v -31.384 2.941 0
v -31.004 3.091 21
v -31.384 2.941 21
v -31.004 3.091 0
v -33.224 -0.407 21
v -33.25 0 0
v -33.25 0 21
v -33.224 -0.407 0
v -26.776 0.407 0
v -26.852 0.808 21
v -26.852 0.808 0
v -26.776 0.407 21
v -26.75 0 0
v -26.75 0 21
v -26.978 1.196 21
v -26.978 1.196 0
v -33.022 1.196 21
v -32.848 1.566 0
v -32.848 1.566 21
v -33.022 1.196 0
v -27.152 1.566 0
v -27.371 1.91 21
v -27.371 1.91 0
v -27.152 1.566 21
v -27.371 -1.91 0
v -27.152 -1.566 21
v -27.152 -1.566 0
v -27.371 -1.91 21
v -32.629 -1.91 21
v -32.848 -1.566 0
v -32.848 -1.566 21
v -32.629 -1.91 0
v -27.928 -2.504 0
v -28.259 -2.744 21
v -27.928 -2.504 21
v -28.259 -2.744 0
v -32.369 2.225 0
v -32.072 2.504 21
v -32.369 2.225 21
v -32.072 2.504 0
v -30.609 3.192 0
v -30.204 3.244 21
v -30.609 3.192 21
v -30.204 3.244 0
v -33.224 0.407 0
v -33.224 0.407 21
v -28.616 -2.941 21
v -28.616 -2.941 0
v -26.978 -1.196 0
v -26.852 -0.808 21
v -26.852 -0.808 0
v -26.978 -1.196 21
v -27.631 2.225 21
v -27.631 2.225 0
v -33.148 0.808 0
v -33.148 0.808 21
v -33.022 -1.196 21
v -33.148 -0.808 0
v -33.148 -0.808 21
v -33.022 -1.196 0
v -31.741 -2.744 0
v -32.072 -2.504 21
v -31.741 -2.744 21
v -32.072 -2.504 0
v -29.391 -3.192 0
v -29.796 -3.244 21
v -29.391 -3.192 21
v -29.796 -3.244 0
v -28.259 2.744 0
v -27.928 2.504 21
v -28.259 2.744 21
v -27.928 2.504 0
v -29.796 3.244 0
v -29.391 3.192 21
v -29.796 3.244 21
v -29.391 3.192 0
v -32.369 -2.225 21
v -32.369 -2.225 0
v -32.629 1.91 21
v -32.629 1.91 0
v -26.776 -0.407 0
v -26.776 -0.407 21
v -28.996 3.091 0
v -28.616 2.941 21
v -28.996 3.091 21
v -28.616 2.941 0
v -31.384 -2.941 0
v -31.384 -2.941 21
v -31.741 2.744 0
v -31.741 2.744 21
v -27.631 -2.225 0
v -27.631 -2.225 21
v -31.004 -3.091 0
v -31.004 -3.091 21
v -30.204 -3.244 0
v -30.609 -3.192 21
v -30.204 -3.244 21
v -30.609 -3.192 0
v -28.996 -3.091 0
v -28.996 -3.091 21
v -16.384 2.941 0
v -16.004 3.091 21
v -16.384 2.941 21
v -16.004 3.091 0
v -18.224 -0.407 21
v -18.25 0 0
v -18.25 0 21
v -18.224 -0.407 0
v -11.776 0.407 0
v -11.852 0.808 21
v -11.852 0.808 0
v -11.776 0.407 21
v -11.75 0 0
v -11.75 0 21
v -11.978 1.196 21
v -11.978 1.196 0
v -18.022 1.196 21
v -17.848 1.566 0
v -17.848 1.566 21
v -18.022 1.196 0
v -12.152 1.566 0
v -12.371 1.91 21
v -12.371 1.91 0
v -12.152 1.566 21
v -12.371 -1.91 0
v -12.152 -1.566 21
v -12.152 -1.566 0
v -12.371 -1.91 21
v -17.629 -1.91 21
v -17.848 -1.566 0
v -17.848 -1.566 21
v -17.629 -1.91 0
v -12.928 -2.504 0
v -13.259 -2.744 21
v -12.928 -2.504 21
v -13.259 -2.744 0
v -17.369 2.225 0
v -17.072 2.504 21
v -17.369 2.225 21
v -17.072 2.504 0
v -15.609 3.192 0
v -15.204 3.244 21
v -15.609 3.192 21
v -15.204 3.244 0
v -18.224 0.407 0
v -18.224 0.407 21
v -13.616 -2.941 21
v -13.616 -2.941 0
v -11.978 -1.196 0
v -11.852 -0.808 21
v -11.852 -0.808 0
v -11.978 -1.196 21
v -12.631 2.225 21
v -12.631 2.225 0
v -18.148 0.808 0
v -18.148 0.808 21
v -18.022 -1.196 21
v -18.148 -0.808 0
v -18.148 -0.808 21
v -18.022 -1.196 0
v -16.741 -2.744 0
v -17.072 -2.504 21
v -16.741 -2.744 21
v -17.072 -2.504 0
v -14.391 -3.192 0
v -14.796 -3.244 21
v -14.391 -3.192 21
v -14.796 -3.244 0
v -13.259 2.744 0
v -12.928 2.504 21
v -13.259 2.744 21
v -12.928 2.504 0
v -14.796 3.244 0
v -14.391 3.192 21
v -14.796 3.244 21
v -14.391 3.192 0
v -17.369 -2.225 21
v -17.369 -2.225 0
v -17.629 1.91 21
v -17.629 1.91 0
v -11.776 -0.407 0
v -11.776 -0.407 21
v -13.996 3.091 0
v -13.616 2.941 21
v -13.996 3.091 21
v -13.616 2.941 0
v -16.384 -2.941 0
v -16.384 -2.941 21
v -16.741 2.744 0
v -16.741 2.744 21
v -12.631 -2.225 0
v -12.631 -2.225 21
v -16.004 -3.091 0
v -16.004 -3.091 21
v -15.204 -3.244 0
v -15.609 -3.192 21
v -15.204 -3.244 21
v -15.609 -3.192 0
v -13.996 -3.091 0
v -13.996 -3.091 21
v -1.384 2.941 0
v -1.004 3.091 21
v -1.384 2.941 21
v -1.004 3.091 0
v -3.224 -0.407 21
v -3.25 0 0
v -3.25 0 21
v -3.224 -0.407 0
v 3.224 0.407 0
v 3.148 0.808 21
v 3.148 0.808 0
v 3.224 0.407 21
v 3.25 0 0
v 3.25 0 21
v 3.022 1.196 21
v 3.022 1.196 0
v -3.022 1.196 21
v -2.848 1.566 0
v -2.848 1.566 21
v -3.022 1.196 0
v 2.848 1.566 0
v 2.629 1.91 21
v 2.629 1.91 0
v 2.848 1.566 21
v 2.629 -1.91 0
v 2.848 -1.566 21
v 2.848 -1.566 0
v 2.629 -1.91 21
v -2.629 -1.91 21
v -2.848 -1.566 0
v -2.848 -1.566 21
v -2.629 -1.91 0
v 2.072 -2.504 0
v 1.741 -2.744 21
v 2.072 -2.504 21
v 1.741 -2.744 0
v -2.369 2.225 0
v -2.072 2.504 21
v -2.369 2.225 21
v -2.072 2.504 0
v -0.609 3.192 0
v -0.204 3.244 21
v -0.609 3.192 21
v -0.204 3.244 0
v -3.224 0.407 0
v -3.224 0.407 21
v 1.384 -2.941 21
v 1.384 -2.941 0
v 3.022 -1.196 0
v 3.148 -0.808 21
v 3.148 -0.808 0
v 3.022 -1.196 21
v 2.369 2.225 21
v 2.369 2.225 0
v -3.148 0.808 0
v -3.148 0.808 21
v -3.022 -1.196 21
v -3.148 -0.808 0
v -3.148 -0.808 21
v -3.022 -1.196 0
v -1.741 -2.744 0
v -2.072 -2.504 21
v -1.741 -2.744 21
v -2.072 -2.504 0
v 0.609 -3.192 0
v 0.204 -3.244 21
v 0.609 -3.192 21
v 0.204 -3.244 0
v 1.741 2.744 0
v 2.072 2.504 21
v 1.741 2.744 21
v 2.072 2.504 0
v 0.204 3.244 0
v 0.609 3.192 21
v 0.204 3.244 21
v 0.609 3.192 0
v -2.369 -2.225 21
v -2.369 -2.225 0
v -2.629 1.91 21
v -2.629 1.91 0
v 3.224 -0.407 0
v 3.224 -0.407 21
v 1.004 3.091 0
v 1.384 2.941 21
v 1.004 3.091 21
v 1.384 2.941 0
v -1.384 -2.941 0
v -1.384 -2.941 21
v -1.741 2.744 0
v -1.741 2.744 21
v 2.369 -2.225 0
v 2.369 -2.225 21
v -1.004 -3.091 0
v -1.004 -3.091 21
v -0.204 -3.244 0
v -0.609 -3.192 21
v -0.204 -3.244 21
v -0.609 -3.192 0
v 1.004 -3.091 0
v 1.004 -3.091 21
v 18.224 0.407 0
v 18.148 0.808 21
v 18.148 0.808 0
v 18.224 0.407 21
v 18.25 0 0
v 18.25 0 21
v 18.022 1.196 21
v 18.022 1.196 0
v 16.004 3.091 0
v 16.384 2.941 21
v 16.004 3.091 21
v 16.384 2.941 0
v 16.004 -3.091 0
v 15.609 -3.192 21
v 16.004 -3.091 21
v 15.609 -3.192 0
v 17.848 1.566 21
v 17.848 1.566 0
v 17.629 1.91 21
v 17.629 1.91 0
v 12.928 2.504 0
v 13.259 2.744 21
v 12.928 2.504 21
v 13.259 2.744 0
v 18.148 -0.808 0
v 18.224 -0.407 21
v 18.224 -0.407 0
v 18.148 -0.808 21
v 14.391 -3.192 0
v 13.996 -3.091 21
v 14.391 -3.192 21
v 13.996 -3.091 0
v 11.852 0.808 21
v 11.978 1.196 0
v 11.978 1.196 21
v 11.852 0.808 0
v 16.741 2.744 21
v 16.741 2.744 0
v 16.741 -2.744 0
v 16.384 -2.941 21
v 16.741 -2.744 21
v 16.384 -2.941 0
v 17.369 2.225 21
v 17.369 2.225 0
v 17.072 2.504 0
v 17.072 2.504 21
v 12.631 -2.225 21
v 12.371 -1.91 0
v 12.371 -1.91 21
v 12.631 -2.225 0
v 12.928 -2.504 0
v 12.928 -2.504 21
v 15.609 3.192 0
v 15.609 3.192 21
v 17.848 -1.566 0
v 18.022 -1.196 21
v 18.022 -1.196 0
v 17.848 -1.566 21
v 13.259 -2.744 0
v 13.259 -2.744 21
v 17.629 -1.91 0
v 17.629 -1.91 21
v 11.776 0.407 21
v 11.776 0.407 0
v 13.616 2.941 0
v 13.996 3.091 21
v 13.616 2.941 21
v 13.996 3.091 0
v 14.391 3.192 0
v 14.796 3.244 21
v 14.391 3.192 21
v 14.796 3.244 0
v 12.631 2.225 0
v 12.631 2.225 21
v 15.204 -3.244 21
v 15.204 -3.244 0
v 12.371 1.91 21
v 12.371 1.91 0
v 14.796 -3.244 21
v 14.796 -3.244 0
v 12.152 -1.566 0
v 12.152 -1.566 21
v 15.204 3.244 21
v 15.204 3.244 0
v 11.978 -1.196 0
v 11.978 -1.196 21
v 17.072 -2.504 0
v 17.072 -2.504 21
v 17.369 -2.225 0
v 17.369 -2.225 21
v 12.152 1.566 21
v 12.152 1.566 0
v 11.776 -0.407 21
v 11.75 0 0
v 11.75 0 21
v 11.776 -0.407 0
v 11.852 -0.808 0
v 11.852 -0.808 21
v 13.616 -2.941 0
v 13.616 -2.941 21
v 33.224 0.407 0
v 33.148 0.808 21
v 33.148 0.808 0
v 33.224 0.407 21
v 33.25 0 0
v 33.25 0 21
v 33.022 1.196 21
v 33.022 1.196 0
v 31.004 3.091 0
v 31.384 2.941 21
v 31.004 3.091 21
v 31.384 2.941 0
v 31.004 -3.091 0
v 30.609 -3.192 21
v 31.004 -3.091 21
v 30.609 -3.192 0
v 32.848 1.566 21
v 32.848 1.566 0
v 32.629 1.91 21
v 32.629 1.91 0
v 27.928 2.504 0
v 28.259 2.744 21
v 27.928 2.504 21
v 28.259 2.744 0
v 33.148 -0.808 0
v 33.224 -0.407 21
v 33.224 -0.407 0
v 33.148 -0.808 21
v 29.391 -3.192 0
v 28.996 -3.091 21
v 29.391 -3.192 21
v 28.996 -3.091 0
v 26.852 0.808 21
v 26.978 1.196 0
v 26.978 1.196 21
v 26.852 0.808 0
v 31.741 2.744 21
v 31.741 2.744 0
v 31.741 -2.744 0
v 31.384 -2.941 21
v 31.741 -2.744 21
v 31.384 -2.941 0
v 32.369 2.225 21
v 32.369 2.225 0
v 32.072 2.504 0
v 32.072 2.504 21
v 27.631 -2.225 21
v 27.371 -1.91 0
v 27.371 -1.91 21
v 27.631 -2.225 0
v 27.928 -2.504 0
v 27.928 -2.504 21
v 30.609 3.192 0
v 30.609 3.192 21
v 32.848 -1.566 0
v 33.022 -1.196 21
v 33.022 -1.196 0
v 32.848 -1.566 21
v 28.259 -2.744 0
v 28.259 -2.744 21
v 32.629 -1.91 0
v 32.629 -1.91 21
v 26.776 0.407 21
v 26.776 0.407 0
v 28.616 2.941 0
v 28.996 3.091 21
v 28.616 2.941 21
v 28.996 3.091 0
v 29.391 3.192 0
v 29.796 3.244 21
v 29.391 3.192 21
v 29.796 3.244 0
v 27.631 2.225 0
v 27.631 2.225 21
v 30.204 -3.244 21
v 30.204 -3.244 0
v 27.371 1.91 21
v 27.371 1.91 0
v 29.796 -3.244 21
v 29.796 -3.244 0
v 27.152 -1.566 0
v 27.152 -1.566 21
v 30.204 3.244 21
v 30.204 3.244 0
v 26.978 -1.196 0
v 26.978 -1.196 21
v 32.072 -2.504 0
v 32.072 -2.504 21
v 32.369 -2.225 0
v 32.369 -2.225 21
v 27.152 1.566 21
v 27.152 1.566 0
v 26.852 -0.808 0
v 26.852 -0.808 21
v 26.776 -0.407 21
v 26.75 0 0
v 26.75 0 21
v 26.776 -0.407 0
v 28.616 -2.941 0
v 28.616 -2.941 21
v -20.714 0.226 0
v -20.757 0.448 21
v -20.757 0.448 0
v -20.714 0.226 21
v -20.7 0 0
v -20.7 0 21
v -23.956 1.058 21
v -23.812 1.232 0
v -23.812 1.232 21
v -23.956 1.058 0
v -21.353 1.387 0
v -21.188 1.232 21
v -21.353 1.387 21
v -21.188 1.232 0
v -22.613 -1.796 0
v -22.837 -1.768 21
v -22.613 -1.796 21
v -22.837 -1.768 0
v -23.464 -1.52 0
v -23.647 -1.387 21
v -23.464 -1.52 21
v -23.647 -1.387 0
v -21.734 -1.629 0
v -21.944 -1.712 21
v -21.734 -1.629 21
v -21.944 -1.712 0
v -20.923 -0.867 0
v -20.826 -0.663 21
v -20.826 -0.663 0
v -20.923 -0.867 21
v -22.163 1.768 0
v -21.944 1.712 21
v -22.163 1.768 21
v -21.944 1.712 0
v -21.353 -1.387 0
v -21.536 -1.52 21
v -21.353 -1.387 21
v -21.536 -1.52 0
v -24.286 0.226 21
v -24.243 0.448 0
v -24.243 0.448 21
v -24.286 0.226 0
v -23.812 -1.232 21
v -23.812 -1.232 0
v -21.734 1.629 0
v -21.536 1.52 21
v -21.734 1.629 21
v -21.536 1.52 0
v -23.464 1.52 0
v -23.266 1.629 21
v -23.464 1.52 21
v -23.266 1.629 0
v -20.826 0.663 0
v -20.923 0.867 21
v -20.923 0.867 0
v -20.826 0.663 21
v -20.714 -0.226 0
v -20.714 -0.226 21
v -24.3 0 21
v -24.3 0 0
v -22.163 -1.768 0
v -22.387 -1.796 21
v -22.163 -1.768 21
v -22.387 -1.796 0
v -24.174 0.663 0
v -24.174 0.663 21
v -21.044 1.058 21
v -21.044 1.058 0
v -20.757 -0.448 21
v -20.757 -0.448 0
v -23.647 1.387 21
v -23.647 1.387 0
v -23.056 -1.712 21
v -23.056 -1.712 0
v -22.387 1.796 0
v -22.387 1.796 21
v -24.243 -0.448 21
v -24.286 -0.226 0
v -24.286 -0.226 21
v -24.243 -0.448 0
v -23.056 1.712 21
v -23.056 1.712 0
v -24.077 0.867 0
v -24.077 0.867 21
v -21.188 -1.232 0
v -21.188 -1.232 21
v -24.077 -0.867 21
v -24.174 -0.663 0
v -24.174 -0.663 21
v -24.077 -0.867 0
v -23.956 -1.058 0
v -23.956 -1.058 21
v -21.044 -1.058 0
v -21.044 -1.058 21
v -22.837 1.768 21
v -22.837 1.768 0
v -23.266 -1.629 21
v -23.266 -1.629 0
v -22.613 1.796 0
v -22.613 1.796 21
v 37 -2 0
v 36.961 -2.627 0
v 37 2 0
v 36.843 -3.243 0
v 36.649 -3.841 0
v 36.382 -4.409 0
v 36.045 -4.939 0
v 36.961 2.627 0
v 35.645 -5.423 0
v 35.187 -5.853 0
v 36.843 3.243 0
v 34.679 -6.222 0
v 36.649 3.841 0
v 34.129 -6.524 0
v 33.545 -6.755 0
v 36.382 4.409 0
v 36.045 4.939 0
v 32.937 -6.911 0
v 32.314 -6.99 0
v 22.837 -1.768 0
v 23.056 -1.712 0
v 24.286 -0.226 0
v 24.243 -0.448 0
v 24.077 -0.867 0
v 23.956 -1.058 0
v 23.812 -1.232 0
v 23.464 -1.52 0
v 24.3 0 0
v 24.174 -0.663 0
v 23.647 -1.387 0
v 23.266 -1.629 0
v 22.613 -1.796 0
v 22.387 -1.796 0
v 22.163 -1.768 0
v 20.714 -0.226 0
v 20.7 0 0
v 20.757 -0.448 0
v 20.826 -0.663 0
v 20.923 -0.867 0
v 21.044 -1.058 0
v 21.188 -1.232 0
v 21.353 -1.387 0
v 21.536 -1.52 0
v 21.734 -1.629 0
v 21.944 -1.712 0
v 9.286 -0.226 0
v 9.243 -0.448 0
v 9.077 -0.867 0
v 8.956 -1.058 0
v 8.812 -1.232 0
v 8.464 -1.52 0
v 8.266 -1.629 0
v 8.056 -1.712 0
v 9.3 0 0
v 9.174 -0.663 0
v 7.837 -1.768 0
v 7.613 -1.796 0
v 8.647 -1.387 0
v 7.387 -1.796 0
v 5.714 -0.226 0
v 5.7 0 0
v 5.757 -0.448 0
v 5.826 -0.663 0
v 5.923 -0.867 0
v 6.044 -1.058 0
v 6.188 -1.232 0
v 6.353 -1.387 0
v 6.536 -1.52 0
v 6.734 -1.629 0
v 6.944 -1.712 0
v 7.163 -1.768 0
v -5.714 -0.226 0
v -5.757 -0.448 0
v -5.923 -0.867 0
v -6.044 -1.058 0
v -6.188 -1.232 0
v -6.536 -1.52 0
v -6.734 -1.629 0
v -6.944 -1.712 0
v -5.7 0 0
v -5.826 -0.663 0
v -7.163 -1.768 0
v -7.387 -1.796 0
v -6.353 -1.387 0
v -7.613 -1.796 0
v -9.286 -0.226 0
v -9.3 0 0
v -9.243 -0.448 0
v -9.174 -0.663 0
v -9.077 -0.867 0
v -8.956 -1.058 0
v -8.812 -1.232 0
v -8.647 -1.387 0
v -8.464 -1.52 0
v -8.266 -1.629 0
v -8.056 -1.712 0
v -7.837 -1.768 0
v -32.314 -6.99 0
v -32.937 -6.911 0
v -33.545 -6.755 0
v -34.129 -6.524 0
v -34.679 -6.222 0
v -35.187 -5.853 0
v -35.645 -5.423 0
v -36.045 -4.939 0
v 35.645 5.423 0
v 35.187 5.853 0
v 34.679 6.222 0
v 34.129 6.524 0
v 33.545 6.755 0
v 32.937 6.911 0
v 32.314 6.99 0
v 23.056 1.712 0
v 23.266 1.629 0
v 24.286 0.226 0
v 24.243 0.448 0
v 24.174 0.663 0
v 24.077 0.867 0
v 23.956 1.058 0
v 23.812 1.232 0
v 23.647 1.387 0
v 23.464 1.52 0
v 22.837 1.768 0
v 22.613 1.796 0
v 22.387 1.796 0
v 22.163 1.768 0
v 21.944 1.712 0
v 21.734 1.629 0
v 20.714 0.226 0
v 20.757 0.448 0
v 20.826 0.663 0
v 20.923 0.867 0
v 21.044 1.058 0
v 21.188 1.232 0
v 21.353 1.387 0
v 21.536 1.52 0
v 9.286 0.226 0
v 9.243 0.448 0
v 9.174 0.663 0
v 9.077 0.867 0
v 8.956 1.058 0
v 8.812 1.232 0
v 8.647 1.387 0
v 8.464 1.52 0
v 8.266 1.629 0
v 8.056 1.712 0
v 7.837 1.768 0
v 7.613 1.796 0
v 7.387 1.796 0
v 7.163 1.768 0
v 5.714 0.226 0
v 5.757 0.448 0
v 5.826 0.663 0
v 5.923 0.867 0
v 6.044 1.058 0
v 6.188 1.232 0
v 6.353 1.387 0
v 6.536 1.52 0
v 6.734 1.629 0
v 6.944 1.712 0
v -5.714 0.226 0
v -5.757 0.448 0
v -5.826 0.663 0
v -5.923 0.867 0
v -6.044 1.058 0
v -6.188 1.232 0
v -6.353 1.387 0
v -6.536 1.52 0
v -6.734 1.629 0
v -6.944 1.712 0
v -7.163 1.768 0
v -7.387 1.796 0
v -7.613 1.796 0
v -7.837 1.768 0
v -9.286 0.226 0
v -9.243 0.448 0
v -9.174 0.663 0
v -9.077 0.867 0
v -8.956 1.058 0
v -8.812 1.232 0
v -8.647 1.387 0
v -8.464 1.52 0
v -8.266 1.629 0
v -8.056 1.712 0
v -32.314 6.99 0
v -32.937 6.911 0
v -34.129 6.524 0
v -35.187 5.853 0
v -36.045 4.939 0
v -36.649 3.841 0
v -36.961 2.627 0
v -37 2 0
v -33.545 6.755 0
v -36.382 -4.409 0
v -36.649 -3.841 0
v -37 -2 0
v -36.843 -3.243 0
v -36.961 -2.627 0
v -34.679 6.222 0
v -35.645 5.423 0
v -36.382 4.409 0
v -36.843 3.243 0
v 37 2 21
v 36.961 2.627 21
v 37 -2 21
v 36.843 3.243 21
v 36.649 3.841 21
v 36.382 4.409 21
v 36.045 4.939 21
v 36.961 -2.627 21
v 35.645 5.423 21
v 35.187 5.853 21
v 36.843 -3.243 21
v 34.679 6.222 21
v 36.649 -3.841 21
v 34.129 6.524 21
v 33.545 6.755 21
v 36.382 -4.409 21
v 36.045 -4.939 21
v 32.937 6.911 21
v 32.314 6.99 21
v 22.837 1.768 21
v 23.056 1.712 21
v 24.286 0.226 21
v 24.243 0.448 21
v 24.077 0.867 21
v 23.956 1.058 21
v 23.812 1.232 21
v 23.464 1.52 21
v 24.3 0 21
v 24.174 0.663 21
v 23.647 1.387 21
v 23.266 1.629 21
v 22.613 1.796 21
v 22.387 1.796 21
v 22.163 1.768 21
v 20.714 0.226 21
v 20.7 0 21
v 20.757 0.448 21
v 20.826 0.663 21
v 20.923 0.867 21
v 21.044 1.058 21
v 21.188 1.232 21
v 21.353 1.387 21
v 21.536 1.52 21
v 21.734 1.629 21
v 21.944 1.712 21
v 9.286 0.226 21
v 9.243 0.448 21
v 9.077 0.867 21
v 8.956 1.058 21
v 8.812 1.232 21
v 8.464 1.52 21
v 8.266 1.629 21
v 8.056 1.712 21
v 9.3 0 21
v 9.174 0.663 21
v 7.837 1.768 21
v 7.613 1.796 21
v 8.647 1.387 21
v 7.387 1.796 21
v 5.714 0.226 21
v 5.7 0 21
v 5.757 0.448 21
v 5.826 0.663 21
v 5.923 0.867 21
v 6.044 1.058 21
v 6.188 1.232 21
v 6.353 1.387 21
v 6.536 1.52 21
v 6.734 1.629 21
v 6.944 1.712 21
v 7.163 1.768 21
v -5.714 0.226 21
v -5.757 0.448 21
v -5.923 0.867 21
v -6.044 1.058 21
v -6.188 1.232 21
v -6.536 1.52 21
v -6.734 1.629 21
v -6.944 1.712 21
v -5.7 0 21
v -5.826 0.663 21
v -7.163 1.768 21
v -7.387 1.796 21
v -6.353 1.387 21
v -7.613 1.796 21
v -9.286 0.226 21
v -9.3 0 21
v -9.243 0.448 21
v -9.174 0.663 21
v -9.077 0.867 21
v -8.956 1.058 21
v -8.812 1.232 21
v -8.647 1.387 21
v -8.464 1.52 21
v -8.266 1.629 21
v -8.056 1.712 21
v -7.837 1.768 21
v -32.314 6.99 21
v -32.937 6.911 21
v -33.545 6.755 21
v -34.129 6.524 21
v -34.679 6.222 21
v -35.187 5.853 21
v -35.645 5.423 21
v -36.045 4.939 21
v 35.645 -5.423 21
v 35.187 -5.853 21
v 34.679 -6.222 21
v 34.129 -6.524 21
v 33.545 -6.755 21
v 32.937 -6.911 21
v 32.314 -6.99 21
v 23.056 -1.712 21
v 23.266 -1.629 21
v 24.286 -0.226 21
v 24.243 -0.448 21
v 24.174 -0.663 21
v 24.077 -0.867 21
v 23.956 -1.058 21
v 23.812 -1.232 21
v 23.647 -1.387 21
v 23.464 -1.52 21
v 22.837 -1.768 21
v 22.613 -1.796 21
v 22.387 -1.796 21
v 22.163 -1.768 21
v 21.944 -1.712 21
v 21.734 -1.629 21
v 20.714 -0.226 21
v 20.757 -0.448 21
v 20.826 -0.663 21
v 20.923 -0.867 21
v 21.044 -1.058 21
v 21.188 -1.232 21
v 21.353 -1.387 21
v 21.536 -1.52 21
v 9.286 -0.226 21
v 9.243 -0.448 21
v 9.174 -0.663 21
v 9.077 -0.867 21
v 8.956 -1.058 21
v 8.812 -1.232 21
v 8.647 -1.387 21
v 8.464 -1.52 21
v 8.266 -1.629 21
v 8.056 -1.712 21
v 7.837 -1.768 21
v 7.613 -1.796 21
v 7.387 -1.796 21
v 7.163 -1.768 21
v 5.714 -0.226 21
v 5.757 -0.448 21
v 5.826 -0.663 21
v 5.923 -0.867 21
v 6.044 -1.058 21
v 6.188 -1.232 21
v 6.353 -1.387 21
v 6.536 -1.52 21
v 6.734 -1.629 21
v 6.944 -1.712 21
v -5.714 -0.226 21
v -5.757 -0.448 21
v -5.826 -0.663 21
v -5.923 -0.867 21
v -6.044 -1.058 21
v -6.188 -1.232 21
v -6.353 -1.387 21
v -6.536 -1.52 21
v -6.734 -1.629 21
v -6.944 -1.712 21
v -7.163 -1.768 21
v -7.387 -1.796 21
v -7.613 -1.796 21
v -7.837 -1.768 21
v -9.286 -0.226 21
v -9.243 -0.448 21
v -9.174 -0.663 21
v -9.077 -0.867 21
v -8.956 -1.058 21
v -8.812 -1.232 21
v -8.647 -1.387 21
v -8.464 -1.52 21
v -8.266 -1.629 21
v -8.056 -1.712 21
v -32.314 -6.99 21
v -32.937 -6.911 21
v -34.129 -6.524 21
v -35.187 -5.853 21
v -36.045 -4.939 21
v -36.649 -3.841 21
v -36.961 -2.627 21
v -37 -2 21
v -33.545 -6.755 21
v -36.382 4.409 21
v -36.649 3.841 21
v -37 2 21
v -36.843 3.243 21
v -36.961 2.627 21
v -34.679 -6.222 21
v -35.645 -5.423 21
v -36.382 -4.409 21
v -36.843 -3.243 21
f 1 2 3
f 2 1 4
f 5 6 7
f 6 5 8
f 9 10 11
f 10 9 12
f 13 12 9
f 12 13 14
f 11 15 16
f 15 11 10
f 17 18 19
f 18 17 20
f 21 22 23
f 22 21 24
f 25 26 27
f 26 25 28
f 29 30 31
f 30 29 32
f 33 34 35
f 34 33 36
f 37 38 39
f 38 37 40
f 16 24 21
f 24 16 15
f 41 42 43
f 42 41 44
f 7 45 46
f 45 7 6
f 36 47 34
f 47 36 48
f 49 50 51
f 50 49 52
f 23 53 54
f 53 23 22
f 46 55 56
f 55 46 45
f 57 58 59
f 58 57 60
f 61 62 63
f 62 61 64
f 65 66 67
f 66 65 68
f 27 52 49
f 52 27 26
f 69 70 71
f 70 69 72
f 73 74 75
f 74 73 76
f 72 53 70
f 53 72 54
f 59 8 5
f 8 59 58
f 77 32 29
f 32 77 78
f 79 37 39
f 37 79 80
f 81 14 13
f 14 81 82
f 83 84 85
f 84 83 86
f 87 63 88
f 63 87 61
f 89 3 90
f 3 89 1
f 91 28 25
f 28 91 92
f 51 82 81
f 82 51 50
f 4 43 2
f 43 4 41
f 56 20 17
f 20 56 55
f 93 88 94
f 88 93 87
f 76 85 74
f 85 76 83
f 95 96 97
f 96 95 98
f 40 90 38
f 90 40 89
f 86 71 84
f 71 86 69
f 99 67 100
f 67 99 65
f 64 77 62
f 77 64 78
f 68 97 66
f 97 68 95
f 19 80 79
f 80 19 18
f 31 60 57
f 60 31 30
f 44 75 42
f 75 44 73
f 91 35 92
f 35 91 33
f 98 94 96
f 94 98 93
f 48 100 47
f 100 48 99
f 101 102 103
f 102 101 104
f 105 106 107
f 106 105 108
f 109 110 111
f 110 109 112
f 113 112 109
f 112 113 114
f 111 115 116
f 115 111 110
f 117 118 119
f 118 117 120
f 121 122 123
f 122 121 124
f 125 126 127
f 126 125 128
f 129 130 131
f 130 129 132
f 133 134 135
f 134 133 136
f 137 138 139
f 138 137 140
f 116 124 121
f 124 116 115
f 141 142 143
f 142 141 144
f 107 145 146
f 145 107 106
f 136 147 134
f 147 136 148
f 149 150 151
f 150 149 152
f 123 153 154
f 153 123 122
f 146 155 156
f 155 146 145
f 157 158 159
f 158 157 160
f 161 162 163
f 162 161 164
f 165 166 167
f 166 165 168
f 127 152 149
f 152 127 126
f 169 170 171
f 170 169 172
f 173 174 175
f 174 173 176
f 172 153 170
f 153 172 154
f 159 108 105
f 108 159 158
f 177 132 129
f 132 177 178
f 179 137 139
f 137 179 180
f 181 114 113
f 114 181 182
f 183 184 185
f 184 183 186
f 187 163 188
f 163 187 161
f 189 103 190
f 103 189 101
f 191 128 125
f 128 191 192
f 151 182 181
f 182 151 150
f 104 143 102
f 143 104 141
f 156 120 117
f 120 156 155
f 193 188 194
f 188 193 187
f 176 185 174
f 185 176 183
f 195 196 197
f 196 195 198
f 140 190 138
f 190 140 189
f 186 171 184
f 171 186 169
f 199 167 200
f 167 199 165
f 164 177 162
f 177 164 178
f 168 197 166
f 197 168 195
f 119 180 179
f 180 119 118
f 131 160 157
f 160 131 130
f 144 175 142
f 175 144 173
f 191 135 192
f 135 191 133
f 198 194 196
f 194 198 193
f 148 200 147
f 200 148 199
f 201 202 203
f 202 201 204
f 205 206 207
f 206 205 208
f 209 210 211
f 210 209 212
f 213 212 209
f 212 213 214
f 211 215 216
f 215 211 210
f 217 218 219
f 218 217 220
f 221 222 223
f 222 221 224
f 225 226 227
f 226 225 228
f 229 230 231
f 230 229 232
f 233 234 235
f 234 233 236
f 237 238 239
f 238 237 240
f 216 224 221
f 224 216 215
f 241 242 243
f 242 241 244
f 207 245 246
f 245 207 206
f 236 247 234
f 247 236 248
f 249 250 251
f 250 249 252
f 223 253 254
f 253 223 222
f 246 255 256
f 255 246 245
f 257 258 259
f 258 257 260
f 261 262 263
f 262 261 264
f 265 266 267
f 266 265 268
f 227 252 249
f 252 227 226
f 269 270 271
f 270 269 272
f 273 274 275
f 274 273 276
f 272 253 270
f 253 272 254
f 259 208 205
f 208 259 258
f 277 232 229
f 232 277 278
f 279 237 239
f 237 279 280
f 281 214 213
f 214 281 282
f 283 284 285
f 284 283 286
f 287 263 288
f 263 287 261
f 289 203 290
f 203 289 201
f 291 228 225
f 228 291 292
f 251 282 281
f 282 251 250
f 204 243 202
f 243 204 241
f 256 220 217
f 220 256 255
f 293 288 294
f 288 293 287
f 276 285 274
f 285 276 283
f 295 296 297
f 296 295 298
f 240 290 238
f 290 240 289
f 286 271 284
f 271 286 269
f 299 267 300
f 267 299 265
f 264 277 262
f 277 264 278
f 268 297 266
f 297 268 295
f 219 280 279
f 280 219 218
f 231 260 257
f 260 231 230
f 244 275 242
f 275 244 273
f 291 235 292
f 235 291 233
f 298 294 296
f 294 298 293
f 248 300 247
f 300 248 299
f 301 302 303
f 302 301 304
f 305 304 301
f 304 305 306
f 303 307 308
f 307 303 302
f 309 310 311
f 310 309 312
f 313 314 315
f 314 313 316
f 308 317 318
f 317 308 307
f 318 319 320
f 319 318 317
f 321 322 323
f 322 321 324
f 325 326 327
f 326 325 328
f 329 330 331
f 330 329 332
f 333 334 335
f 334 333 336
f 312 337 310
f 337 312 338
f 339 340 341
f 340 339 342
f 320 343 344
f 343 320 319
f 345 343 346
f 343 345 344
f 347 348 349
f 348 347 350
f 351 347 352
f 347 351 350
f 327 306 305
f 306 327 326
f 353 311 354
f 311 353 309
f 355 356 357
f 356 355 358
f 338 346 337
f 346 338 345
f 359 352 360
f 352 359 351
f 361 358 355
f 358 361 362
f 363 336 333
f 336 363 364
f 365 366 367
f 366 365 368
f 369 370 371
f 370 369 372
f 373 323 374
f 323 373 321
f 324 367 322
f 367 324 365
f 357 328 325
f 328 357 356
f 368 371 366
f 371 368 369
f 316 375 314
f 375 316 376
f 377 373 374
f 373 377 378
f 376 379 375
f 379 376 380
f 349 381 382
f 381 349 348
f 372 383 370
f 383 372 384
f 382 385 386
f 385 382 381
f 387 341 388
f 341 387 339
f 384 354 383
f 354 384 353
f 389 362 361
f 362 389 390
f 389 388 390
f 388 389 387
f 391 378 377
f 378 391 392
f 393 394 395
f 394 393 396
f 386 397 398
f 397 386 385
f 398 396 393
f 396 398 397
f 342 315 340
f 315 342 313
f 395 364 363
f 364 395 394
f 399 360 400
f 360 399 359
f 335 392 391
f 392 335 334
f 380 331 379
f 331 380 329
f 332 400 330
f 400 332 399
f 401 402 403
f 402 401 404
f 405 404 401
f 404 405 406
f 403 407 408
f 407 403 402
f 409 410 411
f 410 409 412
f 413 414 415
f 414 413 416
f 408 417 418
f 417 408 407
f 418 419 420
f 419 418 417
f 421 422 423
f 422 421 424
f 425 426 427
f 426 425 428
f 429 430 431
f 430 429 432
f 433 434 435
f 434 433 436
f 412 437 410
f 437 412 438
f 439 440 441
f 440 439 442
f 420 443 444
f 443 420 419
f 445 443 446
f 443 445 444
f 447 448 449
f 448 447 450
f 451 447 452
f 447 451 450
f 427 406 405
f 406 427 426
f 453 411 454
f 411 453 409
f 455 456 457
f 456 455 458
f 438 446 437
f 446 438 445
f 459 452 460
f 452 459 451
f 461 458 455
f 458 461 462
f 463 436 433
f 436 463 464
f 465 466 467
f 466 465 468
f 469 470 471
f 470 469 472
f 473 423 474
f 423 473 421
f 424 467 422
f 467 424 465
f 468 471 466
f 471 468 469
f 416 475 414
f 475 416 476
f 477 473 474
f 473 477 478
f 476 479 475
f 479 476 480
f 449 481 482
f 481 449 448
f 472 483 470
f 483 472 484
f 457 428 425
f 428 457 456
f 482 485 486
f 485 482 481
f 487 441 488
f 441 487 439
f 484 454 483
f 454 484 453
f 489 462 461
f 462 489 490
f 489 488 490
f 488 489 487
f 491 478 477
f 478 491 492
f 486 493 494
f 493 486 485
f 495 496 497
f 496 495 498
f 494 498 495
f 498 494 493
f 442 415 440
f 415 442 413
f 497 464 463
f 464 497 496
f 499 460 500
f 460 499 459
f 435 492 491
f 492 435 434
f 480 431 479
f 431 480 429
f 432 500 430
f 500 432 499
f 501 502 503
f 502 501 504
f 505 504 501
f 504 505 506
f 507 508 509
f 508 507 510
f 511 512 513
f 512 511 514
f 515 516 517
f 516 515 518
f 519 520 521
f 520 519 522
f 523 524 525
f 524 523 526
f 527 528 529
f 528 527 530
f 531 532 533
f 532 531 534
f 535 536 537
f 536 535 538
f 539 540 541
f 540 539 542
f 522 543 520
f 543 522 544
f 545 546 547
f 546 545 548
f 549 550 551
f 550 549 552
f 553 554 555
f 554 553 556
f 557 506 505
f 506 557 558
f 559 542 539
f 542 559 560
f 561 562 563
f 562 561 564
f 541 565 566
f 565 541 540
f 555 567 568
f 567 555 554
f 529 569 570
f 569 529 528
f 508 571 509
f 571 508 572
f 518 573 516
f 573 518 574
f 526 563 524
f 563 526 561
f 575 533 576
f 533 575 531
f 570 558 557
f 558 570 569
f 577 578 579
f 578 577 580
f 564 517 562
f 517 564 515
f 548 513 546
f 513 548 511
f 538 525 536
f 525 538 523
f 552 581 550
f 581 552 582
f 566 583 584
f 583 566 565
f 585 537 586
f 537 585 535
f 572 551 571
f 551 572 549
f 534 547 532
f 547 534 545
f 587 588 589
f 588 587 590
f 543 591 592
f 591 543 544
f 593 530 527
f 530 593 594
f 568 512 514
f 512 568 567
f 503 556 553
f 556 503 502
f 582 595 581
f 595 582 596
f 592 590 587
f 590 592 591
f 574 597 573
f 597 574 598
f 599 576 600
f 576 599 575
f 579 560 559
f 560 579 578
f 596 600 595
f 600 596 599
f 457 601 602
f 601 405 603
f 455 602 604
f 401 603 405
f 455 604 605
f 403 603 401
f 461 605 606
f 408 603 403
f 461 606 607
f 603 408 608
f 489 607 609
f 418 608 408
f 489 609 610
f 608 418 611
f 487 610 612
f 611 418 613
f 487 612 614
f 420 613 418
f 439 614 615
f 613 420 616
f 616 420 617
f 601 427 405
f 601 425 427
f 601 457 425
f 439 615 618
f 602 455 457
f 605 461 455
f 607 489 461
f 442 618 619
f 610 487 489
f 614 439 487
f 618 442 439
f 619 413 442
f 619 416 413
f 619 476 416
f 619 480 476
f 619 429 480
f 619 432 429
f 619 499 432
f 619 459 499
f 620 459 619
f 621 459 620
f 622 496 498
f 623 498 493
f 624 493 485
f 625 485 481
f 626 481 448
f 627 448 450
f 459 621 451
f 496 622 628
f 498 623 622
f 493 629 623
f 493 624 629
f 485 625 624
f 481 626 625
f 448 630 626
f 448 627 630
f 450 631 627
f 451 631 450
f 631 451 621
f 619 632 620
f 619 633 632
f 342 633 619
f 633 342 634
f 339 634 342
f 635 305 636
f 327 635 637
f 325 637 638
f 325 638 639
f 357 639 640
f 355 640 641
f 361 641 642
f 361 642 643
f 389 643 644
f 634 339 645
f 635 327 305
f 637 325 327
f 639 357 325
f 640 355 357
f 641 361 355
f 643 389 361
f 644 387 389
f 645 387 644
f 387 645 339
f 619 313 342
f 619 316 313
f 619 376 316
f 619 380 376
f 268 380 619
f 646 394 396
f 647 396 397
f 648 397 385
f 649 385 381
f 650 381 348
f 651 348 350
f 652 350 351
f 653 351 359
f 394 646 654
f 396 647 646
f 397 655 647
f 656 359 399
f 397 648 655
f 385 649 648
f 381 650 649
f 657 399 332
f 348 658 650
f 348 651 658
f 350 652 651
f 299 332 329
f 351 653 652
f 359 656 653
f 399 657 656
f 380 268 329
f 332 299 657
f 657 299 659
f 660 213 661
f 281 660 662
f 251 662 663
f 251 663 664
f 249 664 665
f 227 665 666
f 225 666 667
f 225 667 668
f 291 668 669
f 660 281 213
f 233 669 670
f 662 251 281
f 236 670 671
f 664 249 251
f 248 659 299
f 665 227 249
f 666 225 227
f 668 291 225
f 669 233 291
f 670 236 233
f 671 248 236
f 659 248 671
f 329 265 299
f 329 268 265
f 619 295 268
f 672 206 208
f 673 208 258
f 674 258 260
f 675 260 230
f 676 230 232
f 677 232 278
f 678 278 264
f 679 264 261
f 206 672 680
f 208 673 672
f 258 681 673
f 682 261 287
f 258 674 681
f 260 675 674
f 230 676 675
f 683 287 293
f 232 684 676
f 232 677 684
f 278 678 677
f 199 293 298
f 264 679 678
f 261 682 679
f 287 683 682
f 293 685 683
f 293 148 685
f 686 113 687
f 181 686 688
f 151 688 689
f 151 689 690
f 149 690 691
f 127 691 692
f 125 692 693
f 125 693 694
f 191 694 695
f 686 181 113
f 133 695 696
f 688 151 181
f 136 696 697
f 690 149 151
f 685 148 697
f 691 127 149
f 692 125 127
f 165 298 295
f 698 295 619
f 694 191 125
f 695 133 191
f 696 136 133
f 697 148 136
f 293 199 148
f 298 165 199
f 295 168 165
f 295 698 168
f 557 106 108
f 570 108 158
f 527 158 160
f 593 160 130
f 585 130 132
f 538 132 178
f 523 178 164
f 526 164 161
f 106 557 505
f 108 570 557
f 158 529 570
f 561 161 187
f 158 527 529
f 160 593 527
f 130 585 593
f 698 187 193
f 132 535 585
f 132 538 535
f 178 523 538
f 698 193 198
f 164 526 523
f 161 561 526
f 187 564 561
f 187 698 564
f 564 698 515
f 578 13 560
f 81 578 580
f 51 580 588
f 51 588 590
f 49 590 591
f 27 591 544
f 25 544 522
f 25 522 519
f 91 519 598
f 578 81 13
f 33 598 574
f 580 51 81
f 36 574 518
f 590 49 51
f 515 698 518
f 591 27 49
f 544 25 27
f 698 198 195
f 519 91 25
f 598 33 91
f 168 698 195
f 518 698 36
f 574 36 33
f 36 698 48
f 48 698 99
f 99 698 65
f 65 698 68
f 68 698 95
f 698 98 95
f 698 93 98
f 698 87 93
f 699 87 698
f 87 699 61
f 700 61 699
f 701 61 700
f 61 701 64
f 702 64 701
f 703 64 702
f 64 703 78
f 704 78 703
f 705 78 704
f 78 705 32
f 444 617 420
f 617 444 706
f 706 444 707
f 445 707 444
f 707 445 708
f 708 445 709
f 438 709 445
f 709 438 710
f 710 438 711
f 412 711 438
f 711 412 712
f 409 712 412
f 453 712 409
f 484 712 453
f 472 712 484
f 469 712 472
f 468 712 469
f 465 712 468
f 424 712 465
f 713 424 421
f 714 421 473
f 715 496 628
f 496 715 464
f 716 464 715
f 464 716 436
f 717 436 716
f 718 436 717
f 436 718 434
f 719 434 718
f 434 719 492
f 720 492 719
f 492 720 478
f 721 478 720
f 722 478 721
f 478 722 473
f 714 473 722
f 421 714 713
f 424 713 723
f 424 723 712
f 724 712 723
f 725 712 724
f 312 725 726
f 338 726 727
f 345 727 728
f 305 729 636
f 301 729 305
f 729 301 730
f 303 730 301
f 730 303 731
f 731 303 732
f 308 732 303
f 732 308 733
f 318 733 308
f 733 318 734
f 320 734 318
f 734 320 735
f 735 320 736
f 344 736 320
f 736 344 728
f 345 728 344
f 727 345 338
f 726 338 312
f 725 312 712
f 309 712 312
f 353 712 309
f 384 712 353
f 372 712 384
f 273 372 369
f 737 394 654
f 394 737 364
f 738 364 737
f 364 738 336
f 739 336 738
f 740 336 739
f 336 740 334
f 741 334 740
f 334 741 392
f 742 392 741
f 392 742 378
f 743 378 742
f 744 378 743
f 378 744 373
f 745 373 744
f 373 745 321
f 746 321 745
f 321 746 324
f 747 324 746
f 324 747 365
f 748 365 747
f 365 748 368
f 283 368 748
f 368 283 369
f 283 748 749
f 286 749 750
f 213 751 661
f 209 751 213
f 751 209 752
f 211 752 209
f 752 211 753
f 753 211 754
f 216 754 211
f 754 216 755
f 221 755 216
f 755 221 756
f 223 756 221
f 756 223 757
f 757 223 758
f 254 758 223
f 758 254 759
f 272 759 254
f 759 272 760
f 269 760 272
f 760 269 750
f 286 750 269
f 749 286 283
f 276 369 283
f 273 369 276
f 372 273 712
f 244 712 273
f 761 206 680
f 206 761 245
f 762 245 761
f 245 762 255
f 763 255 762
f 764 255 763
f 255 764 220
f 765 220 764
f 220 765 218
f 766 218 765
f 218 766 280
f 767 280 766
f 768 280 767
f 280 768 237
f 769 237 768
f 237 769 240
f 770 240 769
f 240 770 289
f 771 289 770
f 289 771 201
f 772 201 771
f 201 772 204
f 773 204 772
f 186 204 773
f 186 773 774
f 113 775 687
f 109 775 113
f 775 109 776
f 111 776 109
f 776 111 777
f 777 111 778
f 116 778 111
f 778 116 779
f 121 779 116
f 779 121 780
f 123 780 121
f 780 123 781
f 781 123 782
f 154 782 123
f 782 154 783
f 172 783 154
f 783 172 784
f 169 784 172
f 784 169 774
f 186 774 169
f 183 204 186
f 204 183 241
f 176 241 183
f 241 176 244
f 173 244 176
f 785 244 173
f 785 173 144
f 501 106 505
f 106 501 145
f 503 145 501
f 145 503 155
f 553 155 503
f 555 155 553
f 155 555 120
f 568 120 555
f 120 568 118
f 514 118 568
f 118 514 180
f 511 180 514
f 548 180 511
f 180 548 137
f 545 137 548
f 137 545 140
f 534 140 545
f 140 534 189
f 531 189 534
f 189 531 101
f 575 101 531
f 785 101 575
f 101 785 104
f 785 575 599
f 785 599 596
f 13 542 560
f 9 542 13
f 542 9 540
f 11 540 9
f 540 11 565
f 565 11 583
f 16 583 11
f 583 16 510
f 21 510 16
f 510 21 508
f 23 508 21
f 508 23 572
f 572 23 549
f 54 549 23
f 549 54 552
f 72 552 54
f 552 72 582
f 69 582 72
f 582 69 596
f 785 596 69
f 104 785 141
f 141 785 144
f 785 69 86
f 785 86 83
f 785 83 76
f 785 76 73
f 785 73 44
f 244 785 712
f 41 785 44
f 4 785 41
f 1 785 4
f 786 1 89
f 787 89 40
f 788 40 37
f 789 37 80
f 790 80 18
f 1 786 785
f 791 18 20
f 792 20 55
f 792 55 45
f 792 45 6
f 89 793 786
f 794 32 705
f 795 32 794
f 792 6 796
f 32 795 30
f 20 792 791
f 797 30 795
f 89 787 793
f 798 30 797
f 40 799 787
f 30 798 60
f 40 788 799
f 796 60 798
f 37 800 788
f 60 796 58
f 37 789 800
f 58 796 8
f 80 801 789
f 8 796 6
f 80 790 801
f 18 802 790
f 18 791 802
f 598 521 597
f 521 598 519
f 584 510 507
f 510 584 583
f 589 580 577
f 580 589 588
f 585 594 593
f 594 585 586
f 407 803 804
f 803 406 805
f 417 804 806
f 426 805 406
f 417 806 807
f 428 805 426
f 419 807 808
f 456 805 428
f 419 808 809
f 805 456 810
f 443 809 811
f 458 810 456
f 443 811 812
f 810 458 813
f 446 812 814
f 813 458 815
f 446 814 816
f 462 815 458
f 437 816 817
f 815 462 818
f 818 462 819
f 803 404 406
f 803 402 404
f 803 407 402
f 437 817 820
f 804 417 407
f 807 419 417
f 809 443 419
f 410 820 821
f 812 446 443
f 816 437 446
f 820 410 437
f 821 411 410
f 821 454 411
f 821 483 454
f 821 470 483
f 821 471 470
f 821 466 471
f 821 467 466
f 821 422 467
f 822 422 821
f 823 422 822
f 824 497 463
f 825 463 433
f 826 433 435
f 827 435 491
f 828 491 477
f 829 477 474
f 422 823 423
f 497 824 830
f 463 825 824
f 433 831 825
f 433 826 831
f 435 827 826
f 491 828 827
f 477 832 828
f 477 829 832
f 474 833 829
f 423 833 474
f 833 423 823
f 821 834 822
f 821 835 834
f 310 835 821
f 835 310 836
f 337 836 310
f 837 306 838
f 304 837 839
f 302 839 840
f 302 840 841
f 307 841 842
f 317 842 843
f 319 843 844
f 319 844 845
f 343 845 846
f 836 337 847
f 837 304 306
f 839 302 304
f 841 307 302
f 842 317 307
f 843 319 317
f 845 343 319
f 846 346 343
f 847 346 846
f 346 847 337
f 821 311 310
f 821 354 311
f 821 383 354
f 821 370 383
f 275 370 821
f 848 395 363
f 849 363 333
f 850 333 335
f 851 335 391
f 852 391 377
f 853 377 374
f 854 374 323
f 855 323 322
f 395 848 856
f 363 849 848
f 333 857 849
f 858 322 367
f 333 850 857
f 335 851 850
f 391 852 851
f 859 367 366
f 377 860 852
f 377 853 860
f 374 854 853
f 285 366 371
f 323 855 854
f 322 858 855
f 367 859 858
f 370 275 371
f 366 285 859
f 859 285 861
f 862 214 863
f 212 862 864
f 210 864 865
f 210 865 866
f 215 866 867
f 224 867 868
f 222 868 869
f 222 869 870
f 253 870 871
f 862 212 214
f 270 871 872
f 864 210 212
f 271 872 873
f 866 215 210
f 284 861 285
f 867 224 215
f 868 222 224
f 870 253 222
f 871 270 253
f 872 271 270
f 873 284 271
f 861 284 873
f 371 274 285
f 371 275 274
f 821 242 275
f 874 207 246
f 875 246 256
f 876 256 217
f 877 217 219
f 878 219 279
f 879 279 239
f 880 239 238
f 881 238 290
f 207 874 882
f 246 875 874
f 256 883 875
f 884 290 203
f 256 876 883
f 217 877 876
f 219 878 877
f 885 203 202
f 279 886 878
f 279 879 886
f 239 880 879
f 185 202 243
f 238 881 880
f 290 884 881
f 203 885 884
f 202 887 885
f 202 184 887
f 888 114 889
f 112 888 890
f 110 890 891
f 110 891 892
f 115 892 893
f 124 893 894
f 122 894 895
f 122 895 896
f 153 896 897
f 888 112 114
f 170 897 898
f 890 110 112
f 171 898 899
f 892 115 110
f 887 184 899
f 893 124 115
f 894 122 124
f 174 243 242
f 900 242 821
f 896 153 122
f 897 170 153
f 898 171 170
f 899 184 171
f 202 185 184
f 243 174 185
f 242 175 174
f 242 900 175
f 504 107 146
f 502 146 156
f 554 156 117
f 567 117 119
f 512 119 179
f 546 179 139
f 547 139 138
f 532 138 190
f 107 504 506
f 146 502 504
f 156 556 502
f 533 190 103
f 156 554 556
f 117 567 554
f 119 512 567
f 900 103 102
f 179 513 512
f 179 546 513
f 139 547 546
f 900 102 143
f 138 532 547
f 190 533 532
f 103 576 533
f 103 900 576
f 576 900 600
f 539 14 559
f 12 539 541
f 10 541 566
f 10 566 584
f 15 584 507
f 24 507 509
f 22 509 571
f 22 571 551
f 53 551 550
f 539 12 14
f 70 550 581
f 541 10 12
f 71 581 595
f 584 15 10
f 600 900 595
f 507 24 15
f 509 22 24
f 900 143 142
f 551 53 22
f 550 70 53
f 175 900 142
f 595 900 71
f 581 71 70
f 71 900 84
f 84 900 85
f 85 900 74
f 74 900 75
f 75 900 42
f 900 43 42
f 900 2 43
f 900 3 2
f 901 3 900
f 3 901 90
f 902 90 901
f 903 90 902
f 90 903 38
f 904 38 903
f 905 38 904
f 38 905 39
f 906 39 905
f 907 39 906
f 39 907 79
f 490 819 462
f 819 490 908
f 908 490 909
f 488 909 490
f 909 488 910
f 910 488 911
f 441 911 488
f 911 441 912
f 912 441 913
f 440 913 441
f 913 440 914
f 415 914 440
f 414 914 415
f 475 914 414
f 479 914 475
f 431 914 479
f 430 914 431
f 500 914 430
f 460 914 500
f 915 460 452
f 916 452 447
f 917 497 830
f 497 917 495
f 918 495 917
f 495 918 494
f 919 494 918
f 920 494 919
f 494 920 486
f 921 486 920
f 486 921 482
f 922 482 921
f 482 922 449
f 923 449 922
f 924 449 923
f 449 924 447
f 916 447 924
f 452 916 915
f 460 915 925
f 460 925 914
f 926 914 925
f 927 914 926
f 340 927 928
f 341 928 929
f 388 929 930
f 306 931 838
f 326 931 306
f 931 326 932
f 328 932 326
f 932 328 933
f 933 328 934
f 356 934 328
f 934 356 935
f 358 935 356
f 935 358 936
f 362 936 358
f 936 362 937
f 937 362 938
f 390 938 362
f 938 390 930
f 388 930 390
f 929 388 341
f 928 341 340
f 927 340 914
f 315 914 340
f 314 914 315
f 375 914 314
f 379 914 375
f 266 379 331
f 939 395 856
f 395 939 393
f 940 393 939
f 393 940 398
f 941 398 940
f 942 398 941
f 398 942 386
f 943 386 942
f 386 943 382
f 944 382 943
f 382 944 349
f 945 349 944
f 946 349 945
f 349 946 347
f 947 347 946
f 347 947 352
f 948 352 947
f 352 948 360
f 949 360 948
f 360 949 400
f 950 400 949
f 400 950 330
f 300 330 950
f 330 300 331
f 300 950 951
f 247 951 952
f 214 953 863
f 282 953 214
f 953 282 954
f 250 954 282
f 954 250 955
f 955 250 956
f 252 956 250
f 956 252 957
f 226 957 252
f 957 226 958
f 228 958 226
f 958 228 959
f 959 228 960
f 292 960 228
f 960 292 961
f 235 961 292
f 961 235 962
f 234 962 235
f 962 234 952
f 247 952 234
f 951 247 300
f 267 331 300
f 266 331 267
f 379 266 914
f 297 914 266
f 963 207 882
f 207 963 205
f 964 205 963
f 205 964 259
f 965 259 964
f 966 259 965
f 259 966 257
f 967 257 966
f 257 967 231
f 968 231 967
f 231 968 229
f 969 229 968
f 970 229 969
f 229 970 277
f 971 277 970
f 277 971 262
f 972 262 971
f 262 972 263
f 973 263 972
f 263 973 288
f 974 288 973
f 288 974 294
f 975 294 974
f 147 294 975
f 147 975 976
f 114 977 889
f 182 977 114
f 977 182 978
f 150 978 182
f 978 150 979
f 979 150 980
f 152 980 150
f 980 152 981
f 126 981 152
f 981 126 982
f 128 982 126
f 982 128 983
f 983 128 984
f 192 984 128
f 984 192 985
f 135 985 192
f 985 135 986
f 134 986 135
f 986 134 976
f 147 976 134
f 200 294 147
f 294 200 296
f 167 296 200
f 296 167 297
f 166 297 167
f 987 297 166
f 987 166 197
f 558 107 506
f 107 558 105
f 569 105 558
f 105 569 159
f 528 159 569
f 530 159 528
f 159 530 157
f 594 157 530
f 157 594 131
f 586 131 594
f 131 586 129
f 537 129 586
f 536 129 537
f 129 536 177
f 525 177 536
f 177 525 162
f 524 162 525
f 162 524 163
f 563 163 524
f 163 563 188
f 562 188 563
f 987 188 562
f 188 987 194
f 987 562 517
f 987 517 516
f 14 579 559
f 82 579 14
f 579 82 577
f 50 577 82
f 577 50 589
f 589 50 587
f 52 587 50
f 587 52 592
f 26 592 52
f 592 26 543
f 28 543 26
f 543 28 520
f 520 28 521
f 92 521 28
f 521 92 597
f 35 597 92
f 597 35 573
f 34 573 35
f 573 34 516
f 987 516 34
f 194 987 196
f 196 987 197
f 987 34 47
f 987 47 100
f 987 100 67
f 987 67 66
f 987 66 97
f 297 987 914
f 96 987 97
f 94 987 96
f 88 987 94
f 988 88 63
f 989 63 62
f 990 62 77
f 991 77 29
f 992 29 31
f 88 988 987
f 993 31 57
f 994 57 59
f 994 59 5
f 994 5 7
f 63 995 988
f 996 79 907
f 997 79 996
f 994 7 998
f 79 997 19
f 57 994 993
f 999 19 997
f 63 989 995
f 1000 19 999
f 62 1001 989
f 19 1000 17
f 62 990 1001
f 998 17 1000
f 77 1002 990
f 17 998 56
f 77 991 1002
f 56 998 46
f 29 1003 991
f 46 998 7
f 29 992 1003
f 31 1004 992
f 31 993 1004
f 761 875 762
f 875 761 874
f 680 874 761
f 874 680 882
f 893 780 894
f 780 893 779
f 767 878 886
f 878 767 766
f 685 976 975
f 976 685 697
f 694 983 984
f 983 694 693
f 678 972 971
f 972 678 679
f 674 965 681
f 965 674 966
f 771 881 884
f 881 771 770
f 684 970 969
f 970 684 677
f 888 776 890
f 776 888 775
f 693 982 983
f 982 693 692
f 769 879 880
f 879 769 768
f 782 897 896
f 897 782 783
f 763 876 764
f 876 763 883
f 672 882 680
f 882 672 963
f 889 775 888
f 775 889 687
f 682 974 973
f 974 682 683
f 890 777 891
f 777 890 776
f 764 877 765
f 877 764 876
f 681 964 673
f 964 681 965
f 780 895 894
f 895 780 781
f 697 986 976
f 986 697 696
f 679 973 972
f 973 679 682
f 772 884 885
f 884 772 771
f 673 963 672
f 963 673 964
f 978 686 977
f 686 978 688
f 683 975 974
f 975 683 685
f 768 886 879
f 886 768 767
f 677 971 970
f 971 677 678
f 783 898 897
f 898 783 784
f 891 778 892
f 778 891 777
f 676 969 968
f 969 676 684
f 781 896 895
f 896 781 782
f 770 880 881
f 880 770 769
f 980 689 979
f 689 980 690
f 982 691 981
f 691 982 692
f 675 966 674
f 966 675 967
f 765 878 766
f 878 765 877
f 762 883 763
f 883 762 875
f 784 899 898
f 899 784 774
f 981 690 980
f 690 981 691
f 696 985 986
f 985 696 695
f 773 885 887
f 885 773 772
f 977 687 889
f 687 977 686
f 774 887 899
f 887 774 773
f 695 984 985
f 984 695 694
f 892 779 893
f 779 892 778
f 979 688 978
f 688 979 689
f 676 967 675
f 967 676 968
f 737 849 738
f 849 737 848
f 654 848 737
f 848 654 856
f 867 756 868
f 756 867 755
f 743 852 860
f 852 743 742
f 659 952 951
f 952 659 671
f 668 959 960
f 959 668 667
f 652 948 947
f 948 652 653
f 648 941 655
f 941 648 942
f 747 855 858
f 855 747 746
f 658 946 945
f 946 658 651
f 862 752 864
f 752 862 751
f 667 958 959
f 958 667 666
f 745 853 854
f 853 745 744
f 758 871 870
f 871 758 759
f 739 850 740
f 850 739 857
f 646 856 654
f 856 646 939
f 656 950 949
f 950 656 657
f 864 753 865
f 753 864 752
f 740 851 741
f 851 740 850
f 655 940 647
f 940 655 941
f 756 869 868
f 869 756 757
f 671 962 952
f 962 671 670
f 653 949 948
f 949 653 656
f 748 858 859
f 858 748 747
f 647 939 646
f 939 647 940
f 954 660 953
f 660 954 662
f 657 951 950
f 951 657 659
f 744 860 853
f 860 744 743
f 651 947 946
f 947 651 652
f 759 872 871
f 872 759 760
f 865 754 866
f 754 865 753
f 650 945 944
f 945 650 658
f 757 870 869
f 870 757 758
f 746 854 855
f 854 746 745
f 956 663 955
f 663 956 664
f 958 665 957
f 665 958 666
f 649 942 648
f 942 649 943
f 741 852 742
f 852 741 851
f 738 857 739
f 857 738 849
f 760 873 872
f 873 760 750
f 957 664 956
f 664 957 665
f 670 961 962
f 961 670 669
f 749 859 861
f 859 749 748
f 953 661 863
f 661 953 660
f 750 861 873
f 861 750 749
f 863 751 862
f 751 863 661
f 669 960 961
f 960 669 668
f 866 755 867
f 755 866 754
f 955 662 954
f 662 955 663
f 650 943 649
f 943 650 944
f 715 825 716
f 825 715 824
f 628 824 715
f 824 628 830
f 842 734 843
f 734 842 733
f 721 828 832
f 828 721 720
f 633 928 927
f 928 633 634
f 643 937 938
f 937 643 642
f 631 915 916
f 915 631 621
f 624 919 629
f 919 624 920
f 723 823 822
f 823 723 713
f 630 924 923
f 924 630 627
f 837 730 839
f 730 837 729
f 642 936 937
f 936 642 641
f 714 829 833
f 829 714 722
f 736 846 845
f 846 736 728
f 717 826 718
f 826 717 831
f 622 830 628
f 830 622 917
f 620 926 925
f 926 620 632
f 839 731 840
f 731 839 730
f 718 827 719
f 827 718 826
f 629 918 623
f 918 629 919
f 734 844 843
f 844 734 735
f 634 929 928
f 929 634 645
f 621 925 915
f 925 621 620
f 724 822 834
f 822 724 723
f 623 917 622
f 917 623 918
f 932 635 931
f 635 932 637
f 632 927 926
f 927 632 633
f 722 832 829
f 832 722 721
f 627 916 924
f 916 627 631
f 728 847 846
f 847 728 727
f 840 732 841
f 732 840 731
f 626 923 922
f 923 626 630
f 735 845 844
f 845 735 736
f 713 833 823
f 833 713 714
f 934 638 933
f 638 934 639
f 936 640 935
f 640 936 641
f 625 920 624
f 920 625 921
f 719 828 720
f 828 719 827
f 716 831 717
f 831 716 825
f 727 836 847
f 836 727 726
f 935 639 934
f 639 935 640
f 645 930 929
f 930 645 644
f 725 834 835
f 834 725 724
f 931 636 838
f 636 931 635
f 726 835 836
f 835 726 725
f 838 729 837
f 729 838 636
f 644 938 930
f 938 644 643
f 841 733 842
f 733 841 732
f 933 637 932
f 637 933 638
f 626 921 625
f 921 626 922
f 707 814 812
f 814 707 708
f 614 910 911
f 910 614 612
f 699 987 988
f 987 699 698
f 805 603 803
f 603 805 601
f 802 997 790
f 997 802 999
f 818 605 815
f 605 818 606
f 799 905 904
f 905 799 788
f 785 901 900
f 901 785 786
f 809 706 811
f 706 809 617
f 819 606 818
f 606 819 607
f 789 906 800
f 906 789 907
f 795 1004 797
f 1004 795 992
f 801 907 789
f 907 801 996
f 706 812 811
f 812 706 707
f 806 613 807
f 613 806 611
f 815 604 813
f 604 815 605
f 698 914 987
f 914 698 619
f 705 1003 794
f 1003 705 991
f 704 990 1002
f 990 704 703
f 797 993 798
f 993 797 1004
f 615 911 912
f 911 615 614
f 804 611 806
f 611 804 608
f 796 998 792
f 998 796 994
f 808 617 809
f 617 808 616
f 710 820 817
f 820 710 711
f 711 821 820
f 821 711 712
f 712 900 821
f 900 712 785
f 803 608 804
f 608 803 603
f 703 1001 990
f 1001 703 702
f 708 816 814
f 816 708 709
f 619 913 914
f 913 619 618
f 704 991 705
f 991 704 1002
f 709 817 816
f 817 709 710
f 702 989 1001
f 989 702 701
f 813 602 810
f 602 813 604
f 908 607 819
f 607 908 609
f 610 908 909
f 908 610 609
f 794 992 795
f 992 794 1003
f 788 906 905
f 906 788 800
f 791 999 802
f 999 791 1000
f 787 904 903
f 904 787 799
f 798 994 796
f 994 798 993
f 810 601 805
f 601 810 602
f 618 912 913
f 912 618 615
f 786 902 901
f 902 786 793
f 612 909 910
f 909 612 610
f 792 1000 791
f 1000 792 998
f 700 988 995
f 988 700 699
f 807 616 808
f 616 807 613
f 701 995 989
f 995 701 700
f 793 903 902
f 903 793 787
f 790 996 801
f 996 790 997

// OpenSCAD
$fn = 50;


difference() {
	union() {
		hull() {
			translate(v = [-32.0000000000, 2.0000000000, 0]) {
				cylinder(h = 21, r = 5);
			}
			translate(v = [32.0000000000, 2.0000000000, 0]) {
				cylinder(h = 21, r = 5);
			}
			translate(v = [-32.0000000000, -2.0000000000, 0]) {
				cylinder(h = 21, r = 5);
			}
			translate(v = [32.0000000000, -2.0000000000, 0]) {
				cylinder(h = 21, r = 5);
			}
		}
	}
	union() {
		translate(v = [-30.0000000000, 0.0000000000, -100.0000000000]) {
			cylinder(h = 200, r = 3.2500000000);
		}
		translate(v = [-15.0000000000, 0.0000000000, -100.0000000000]) {
			cylinder(h = 200, r = 3.2500000000);
		}
		translate(v = [0.0000000000, 0.0000000000, -100.0000000000]) {
			cylinder(h = 200, r = 3.2500000000);
		}
		translate(v = [15.0000000000, 0.0000000000, -100.0000000000]) {
			cylinder(h = 200, r = 3.2500000000);
		}
		translate(v = [30.0000000000, 0.0000000000, -100.0000000000]) {
			cylinder(h = 200, r = 3.2500000000);
		}
		translate(v = [-30.0000000000, 0.0000000000, 0]) {
			cylinder(h = 21, r = 1.8000000000);
		}
		translate(v = [-22.5000000000, 0.0000000000, 0]) {
			cylinder(h = 21, r = 1.8000000000);
		}
		translate(v = [-15.0000000000, 0.0000000000, 0]) {
			cylinder(h = 21, r = 1.8000000000);
		}
		translate(v = [-7.5000000000, 0.0000000000, 0]) {
			cylinder(h = 21, r = 1.8000000000);
		}
		cylinder(h = 21, r = 1.8000000000);
		translate(v = [7.5000000000, 0.0000000000, 0]) {
			cylinder(h = 21, r = 1.8000000000);
		}
		translate(v = [15.0000000000, 0.0000000000, 0]) {
			cylinder(h = 21, r = 1.8000000000);
		}
		translate(v = [22.5000000000, 0.0000000000, 0]) {
			cylinder(h = 21, r = 1.8000000000);
		}
		translate(v = [30.0000000000, 0.0000000000, 0]) {
			cylinder(h = 21, r = 1.8000000000);
		}
		translate(v = [-30.0000000000, 0.0000000000, 0]) {
			cylinder(h = 21, r = 1.8000000000);
		}
		translate(v = [-22.5000000000, 0.0000000000, 0]) {
			cylinder(h = 21, r = 1.8000000000);
		}
		translate(v = [-15.0000000000, 0.0000000000, 0]) {
			cylinder(h = 21, r = 1.8000000000);
		}
		translate(v = [-7.5000000000, 0.0000000000, 0]) {
			cylinder(h = 21, r = 1.8000000000);
		}
		cylinder(h = 21, r = 1.8000000000);
		translate(v = [7.5000000000, 0.0000000000, 0]) {
			cylinder(h = 21, r = 1.8000000000);
		}
		translate(v = [15.0000000000, 0.0000000000, 0]) {
			cylinder(h = 21, r = 1.8000000000);
		}
		translate(v = [22.5000000000, 0.0000000000, 0]) {
			cylinder(h = 21, r = 1.8000000000);
		}
		translate(v = [30.0000000000, 0.0000000000, 0]) {
			cylinder(h = 21, r = 1.8000000000);
		}
		translate(v = [-30.0000000000, 0.0000000000, 0]) {
			cylinder(h = 21, r = 1.8000000000);
		}
		translate(v = [-22.5000000000, 0.0000000000, 0]) {
			cylinder(h = 21, r = 1.8000000000);
		}
		translate(v = [-15.0000000000, 0.0000000000, 0]) {
			cylinder(h = 21, r = 1.8000000000);
		}
		translate(v = [-7.5000000000, 0.0000000000, 0]) {
			cylinder(h = 21, r = 1.8000000000);
		}
		cylinder(h = 21, r = 1.8000000000);
		translate(v = [7.5000000000, 0.0000000000, 0]) {
			cylinder(h = 21, r = 1.8000000000);
		}
		translate(v = [15.0000000000, 0.0000000000, 0]) {
			cylinder(h = 21, r = 1.8000000000);
		}
		translate(v = [22.5000000000, 0.0000000000, 0]) {
			cylinder(h = 21, r = 1.8000000000);
		}
		translate(v = [30.0000000000, 0.0000000000, 0]) {
			cylinder(h = 21, r = 1.8000000000);
		}
	}
}
